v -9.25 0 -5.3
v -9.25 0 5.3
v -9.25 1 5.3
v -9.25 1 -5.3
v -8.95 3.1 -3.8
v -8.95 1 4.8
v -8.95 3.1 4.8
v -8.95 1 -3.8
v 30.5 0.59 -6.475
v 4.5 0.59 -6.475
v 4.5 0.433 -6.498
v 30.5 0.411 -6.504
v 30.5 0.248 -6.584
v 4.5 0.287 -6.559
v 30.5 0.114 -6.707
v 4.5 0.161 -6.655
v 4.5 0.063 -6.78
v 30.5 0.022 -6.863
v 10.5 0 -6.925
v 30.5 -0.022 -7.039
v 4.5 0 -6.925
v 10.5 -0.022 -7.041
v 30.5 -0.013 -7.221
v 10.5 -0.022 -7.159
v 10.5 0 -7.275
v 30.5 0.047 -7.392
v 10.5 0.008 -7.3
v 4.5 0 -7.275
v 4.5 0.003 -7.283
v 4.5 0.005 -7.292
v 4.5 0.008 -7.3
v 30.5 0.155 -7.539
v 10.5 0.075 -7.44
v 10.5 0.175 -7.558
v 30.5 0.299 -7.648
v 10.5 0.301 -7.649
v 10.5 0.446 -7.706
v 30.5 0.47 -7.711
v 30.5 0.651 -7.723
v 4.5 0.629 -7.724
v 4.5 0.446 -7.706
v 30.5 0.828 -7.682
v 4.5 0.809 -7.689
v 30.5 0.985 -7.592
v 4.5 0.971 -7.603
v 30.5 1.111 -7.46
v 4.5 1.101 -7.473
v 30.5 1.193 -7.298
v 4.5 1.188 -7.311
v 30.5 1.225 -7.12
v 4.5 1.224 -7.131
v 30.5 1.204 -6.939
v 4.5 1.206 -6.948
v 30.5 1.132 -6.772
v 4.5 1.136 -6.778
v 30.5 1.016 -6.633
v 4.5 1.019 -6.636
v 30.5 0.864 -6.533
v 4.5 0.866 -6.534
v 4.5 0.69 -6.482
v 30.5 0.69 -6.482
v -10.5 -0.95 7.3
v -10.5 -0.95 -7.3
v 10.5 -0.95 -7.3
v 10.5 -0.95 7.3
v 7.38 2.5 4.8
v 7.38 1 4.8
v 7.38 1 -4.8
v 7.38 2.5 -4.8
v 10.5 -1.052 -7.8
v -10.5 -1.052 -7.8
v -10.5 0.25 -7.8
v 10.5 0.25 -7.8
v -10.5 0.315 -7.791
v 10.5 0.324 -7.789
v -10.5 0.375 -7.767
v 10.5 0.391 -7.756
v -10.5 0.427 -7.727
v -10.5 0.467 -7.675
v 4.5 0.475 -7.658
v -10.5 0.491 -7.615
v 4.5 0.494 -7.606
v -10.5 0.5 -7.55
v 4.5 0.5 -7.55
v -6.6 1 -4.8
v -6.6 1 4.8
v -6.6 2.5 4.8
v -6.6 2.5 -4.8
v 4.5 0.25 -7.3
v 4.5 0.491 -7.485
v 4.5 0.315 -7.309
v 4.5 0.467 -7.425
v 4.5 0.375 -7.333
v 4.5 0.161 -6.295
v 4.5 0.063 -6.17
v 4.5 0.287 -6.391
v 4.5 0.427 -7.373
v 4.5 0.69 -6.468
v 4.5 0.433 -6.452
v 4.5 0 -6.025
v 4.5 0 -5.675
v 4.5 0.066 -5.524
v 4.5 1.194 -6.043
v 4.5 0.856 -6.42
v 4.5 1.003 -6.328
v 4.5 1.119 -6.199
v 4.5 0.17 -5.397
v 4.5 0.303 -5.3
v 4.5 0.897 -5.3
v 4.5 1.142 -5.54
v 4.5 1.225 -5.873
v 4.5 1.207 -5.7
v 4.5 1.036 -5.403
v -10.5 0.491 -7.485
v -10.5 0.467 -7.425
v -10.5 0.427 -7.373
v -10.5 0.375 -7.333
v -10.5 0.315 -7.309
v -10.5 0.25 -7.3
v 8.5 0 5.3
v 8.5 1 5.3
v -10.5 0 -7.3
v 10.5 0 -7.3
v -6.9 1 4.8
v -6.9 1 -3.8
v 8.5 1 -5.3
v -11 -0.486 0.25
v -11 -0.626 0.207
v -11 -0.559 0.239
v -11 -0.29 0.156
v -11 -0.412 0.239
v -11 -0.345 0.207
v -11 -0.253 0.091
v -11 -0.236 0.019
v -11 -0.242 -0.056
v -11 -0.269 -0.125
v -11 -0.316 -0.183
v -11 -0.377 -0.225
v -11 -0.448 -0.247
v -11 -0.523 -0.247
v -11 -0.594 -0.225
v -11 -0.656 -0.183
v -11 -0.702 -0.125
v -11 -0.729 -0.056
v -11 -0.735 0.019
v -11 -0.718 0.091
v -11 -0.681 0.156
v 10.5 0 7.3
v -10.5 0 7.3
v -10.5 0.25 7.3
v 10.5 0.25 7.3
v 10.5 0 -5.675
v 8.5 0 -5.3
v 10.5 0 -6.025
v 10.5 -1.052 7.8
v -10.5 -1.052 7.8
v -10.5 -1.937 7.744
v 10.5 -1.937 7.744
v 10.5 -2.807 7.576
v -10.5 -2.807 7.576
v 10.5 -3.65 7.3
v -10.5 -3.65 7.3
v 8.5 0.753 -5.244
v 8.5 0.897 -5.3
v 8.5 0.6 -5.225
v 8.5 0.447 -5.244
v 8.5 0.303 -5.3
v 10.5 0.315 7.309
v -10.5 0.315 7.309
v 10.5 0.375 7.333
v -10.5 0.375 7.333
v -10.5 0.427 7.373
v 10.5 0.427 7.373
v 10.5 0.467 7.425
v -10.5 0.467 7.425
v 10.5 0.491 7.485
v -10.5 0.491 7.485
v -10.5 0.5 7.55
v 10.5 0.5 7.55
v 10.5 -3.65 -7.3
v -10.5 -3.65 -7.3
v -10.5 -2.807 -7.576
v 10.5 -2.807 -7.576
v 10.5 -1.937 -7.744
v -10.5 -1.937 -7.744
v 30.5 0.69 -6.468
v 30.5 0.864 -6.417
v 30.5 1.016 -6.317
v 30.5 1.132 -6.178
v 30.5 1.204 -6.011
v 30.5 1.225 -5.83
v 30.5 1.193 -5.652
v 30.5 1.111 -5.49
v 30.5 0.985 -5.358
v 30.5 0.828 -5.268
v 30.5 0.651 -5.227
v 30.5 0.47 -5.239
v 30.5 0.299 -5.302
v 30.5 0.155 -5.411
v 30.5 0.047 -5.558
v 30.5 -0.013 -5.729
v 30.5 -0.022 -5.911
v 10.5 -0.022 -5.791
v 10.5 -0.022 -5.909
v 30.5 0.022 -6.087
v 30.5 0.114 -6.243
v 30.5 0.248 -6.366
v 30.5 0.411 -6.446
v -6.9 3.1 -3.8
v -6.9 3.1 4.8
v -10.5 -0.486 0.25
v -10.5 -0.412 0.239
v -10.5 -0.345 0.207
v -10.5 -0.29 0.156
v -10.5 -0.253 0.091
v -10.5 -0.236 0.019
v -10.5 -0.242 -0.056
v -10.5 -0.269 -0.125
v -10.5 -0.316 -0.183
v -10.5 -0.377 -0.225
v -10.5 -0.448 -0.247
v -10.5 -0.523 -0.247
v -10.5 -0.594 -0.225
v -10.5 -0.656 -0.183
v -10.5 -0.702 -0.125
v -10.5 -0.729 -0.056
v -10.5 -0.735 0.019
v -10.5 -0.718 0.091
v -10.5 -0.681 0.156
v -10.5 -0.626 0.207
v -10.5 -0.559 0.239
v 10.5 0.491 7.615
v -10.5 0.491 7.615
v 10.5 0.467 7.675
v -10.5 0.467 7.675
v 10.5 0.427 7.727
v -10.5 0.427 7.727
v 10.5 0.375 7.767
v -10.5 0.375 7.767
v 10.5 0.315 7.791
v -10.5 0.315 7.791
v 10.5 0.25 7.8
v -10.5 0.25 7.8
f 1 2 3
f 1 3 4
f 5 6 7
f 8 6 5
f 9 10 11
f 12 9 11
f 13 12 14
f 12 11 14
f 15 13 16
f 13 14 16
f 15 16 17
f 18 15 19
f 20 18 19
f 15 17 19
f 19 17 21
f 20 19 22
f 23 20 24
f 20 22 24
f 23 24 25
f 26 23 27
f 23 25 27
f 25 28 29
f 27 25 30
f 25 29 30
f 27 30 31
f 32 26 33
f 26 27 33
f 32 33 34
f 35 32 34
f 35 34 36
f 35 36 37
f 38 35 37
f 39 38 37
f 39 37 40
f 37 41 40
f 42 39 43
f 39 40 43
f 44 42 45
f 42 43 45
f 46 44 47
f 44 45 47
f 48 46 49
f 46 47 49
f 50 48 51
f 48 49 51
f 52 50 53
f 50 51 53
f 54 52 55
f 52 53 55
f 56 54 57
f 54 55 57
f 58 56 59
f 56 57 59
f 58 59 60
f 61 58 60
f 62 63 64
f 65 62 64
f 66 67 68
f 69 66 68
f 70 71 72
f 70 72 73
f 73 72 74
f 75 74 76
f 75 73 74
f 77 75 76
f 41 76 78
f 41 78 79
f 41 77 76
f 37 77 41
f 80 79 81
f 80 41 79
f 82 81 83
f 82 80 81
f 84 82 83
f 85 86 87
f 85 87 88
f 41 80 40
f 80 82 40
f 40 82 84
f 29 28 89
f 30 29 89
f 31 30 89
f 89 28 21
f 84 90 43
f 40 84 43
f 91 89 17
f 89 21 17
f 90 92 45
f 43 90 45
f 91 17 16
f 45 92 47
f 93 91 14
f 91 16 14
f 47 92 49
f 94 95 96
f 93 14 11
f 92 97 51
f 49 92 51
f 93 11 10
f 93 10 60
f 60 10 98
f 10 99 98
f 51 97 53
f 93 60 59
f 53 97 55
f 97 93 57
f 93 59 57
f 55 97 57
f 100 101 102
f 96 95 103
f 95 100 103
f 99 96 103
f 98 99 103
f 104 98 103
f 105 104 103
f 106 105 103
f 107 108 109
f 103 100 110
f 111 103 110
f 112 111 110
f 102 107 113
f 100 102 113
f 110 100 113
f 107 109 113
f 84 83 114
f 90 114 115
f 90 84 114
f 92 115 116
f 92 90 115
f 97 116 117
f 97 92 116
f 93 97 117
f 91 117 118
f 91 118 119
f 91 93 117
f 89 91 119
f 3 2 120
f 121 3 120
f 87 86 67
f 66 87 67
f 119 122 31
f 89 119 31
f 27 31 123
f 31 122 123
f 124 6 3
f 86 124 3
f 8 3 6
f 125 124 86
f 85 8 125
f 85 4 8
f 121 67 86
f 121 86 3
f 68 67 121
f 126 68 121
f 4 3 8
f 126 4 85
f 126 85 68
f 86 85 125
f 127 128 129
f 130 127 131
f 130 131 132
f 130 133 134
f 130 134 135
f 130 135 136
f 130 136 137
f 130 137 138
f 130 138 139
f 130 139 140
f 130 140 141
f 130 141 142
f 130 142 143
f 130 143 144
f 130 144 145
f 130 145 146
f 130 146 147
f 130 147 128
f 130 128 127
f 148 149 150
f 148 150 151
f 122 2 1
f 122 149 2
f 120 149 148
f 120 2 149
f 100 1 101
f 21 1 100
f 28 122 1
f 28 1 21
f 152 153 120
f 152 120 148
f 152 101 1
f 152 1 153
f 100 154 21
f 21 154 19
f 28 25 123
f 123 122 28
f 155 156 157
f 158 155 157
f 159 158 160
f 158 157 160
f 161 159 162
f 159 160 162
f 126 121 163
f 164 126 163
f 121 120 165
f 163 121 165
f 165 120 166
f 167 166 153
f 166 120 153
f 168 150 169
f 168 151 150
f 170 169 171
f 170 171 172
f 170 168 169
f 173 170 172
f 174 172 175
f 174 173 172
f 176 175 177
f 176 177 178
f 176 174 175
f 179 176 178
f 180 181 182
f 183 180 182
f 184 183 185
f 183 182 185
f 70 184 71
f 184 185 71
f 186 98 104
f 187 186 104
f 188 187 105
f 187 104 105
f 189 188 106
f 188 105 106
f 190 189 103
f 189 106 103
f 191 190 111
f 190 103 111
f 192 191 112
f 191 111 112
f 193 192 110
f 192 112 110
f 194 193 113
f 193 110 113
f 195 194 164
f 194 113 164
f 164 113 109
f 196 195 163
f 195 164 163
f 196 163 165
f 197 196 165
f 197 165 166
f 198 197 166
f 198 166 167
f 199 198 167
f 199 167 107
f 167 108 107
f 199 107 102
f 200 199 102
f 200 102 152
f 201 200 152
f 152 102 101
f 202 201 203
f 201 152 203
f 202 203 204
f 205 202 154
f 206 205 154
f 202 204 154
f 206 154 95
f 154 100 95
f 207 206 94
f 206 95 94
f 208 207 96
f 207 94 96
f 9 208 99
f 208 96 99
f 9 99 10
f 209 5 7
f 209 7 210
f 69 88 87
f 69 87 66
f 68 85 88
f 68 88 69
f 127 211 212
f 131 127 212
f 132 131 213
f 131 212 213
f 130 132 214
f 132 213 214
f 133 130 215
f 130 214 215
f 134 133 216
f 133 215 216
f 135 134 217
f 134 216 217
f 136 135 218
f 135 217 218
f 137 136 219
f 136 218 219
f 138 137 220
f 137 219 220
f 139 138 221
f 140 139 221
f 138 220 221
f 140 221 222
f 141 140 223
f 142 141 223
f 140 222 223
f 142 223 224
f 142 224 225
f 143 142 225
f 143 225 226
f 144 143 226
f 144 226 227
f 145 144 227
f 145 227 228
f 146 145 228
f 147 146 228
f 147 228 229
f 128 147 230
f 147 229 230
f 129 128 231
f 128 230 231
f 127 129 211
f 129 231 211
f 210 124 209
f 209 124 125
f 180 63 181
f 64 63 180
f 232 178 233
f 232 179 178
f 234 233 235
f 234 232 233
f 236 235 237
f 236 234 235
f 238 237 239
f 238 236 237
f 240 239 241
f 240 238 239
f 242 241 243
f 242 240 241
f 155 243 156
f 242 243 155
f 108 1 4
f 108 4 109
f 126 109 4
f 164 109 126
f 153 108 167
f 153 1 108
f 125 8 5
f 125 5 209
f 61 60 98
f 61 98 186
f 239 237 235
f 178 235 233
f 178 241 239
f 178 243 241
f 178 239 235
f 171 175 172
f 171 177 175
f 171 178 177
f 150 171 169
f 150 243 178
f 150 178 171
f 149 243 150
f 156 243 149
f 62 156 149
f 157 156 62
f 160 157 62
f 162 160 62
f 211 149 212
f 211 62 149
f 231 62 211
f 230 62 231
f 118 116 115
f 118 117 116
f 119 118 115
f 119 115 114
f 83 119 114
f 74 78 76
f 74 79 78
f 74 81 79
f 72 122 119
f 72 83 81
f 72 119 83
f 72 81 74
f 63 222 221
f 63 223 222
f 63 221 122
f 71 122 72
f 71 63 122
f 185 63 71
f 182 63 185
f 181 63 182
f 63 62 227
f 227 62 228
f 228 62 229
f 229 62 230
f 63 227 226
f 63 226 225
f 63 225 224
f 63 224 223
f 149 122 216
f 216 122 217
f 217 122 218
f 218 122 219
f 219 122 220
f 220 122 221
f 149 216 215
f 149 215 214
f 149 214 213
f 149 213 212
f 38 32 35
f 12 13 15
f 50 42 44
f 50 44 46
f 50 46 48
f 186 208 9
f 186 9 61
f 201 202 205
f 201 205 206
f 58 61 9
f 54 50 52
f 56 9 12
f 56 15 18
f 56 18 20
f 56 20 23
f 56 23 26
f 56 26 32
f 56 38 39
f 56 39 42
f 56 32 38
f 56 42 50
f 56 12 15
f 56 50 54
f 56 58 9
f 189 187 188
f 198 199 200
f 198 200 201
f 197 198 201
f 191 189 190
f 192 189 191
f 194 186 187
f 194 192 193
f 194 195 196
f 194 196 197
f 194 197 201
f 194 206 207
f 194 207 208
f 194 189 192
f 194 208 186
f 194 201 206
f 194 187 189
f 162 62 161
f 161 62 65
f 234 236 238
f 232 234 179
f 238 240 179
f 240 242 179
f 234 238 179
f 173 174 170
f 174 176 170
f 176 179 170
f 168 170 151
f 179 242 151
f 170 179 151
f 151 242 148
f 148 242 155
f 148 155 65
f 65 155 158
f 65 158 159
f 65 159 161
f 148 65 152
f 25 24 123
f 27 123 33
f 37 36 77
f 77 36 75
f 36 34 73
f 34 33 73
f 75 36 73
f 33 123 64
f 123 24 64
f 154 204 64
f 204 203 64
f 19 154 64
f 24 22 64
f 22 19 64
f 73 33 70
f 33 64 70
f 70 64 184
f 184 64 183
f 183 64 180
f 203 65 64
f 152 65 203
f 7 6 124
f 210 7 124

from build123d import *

# Parameters (mm, degrees)
SKETCH1_W               = 21
SKETCH1_H               = 15.6
BOSS_EXTRUDE1_DEPTH     = 0.95
SKETCH2_W               = 21
SKETCH2_H               = 0.5
BOSS_EXTRUDE2_DEPTH     = 2.7
FILLET1_R               = 7
SKETCH3_W               = 17.75
SKETCH3_H               = 10.6
BOSS_EXTRUDE3_DEPTH     = 1
SKETCH4_W               = 13.98
SKETCH4_H               = 9.6
BOSS_EXTRUDE4_DEPTH     = 2.5
SKETCH5_W               = 2.05
SKETCH5_H               = 8.6
BOSS_EXTRUDE5_DEPTH     = 3.1
SKETCH6_W               = 21
SKETCH6_H               = 0.5
BOSS_EXTRUDE6_DEPTH     = 0.5
FILLET2_R               = 0.25
BOSS_EXTRUDE9_START     = -7.66445529
BOSS_EXTRUDE9_OUTLINE_W = 26
BOSS_EXTRUDE9_OUTLINE_H = 0.1
BOSS_EXTRUDE9_DEPTH     = 2.36445529
BOSS_EXTRUDE9_START_2   = 4.5
BOSS_EXTRUDE9_2_DEPTH   = 26
SKETCH8_R               = 0.25
BOSS_EXTRUDE10_DEPTH    = 0.5


with BuildPart() as part:
    # Sketch1 → Boss-Extrude1 (new body)
    with BuildSketch(Plane(origin=(0, 0, 0), x_dir=(1, 0, 0), z_dir=(0, 1, 0))):
        Rectangle(SKETCH1_W, SKETCH1_H)
    extrude(amount=-BOSS_EXTRUDE1_DEPTH)

    # Sketch2 → Boss-Extrude2 (add)
    with BuildSketch(Plane.XZ.offset(0.95)):
        with Locations((0, 7.55)):
            Rectangle(SKETCH2_W, SKETCH2_H)
        with Locations((0, -7.55)):
            Rectangle(SKETCH2_W, SKETCH2_H)
    extrude(amount=BOSS_EXTRUDE2_DEPTH)

    # Fillet1
    # the kernel refuses this fillet: 7 mm, written as the material it takes off along each edge
    with BuildSketch(Plane(origin=(-16.995190528, -3.65, -7.8), x_dir=(0, 1, 0), z_dir=(1, 0, 0))) as fillet1_piece_1:
        with BuildLine():
            CenterArc((2.598076211, 7), FILLET1_R, 248.213210702, 21.786789298)
            Line((0, 0.5), (0, 0))
            Line((0, 0), (2.598076211, 0))
        make_face()
    extrude(amount=33.990381057, mode=Mode.SUBTRACT)
    with BuildSketch(Plane(origin=(-16.995190528, -3.65, 7.8), x_dir=(0, 1, 0), z_dir=(1, 0, 0))) as fillet1_piece_2:
        with BuildLine():
            CenterArc((2.598076211, -7), FILLET1_R, 90, 21.786789298)
            Line((0, -0.5), (0, 0))
            Line((0, 0), (2.598076211, 0))
        make_face()
    extrude(amount=33.990381057, mode=Mode.SUBTRACT)

    # Sketch3 → Boss-Extrude3 (add)
    with BuildSketch(Plane(origin=(0, 0, 0), x_dir=(1, 0, 0), z_dir=(0, 1, 0))):
        with Locations((-0.375, 0)):
            Rectangle(SKETCH3_W, SKETCH3_H)
    extrude(amount=BOSS_EXTRUDE3_DEPTH)

    # Sketch4 → Boss-Extrude4 (add)
    with BuildSketch(Plane(origin=(0, 0, 0), x_dir=(1, 0, 0), z_dir=(0, 1, 0))):
        with Locations((0.39, 0)):
            Rectangle(SKETCH4_W, SKETCH4_H)
    extrude(amount=BOSS_EXTRUDE4_DEPTH)

    # Sketch5 → Boss-Extrude5 (add)
    with BuildSketch(Plane(origin=(0, 0, 0), x_dir=(1, 0, 0), z_dir=(0, 1, 0))):
        with Locations((-7.925, -0.5)):
            Rectangle(SKETCH5_W, SKETCH5_H)
    extrude(amount=BOSS_EXTRUDE5_DEPTH)

    # Sketch6 → Boss-Extrude6 (add)
    with BuildSketch(Plane(origin=(0, 0, 0), x_dir=(1, 0, 0), z_dir=(0, 1, 0))):
        with Locations((0, 7.55)):
            Rectangle(SKETCH6_W, SKETCH6_H)
        with Locations((0, -7.55)):
            Rectangle(SKETCH6_W, SKETCH6_H)
    extrude(amount=BOSS_EXTRUDE6_DEPTH)

    # Fillet2
    fillet2_edges = [part.edges().sort_by_distance(p)[0] for p in [
        (0, 0.5, 7.8),
        (0, 0.5, 7.3),
        (0, 0.5, -7.3),
        (0, 0.5, -7.8),
    ]]
    fillet(fillet2_edges, radius=FILLET2_R - 0.0001)  # a hair under: the kernel refuses the full size

    # Boss-Extrude9: read off the stored shape, not the designer's step
    # Boss-Extrude9 outline → Boss-Extrude9 (add)
    with BuildSketch(Plane.XY.offset(BOSS_EXTRUDE9_START)):
        with Locations((17.5, 0.64)):
            Rectangle(BOSS_EXTRUDE9_OUTLINE_W, BOSS_EXTRUDE9_OUTLINE_H)
    extrude(amount=BOSS_EXTRUDE9_DEPTH)

    # Boss-Extrude9 2 outline → Boss-Extrude9 2 (add)
    with BuildSketch(Plane.YZ.offset(BOSS_EXTRUDE9_START_2)):
        with BuildLine():
            Line((0.69, -5.3), (0.69, -6.468486055))
            ThreePointArc((0.69, -6.468486055), (0.559870848, -5.22628961), (0.59, -6.474919995))
            Line((0.59, -6.474919995), (0.59, -5.3))
            Line((0.59, -5.3), (0.69, -5.3))
        make_face()
        with BuildLine():
            Line((0.69, -6.481513945), (0.69, -7.66445529))
            Line((0.69, -7.66445529), (0.59, -7.66445529))
            Line((0.59, -7.66445529), (0.59, -6.475080005))
            ThreePointArc((0.59, -6.475080005), (0.559870848, -7.72371039), (0.69, -6.481513945))
        make_face()
    extrude(amount=BOSS_EXTRUDE9_2_DEPTH)

    # Sketch8 → Boss-Extrude10 (add)
    with BuildSketch(Plane.ZY.offset(10.5)):
        with Locations((0, -0.485546963)):
            Circle(SKETCH8_R)
    extrude(amount=BOSS_EXTRUDE10_DEPTH)


solid = part.part
